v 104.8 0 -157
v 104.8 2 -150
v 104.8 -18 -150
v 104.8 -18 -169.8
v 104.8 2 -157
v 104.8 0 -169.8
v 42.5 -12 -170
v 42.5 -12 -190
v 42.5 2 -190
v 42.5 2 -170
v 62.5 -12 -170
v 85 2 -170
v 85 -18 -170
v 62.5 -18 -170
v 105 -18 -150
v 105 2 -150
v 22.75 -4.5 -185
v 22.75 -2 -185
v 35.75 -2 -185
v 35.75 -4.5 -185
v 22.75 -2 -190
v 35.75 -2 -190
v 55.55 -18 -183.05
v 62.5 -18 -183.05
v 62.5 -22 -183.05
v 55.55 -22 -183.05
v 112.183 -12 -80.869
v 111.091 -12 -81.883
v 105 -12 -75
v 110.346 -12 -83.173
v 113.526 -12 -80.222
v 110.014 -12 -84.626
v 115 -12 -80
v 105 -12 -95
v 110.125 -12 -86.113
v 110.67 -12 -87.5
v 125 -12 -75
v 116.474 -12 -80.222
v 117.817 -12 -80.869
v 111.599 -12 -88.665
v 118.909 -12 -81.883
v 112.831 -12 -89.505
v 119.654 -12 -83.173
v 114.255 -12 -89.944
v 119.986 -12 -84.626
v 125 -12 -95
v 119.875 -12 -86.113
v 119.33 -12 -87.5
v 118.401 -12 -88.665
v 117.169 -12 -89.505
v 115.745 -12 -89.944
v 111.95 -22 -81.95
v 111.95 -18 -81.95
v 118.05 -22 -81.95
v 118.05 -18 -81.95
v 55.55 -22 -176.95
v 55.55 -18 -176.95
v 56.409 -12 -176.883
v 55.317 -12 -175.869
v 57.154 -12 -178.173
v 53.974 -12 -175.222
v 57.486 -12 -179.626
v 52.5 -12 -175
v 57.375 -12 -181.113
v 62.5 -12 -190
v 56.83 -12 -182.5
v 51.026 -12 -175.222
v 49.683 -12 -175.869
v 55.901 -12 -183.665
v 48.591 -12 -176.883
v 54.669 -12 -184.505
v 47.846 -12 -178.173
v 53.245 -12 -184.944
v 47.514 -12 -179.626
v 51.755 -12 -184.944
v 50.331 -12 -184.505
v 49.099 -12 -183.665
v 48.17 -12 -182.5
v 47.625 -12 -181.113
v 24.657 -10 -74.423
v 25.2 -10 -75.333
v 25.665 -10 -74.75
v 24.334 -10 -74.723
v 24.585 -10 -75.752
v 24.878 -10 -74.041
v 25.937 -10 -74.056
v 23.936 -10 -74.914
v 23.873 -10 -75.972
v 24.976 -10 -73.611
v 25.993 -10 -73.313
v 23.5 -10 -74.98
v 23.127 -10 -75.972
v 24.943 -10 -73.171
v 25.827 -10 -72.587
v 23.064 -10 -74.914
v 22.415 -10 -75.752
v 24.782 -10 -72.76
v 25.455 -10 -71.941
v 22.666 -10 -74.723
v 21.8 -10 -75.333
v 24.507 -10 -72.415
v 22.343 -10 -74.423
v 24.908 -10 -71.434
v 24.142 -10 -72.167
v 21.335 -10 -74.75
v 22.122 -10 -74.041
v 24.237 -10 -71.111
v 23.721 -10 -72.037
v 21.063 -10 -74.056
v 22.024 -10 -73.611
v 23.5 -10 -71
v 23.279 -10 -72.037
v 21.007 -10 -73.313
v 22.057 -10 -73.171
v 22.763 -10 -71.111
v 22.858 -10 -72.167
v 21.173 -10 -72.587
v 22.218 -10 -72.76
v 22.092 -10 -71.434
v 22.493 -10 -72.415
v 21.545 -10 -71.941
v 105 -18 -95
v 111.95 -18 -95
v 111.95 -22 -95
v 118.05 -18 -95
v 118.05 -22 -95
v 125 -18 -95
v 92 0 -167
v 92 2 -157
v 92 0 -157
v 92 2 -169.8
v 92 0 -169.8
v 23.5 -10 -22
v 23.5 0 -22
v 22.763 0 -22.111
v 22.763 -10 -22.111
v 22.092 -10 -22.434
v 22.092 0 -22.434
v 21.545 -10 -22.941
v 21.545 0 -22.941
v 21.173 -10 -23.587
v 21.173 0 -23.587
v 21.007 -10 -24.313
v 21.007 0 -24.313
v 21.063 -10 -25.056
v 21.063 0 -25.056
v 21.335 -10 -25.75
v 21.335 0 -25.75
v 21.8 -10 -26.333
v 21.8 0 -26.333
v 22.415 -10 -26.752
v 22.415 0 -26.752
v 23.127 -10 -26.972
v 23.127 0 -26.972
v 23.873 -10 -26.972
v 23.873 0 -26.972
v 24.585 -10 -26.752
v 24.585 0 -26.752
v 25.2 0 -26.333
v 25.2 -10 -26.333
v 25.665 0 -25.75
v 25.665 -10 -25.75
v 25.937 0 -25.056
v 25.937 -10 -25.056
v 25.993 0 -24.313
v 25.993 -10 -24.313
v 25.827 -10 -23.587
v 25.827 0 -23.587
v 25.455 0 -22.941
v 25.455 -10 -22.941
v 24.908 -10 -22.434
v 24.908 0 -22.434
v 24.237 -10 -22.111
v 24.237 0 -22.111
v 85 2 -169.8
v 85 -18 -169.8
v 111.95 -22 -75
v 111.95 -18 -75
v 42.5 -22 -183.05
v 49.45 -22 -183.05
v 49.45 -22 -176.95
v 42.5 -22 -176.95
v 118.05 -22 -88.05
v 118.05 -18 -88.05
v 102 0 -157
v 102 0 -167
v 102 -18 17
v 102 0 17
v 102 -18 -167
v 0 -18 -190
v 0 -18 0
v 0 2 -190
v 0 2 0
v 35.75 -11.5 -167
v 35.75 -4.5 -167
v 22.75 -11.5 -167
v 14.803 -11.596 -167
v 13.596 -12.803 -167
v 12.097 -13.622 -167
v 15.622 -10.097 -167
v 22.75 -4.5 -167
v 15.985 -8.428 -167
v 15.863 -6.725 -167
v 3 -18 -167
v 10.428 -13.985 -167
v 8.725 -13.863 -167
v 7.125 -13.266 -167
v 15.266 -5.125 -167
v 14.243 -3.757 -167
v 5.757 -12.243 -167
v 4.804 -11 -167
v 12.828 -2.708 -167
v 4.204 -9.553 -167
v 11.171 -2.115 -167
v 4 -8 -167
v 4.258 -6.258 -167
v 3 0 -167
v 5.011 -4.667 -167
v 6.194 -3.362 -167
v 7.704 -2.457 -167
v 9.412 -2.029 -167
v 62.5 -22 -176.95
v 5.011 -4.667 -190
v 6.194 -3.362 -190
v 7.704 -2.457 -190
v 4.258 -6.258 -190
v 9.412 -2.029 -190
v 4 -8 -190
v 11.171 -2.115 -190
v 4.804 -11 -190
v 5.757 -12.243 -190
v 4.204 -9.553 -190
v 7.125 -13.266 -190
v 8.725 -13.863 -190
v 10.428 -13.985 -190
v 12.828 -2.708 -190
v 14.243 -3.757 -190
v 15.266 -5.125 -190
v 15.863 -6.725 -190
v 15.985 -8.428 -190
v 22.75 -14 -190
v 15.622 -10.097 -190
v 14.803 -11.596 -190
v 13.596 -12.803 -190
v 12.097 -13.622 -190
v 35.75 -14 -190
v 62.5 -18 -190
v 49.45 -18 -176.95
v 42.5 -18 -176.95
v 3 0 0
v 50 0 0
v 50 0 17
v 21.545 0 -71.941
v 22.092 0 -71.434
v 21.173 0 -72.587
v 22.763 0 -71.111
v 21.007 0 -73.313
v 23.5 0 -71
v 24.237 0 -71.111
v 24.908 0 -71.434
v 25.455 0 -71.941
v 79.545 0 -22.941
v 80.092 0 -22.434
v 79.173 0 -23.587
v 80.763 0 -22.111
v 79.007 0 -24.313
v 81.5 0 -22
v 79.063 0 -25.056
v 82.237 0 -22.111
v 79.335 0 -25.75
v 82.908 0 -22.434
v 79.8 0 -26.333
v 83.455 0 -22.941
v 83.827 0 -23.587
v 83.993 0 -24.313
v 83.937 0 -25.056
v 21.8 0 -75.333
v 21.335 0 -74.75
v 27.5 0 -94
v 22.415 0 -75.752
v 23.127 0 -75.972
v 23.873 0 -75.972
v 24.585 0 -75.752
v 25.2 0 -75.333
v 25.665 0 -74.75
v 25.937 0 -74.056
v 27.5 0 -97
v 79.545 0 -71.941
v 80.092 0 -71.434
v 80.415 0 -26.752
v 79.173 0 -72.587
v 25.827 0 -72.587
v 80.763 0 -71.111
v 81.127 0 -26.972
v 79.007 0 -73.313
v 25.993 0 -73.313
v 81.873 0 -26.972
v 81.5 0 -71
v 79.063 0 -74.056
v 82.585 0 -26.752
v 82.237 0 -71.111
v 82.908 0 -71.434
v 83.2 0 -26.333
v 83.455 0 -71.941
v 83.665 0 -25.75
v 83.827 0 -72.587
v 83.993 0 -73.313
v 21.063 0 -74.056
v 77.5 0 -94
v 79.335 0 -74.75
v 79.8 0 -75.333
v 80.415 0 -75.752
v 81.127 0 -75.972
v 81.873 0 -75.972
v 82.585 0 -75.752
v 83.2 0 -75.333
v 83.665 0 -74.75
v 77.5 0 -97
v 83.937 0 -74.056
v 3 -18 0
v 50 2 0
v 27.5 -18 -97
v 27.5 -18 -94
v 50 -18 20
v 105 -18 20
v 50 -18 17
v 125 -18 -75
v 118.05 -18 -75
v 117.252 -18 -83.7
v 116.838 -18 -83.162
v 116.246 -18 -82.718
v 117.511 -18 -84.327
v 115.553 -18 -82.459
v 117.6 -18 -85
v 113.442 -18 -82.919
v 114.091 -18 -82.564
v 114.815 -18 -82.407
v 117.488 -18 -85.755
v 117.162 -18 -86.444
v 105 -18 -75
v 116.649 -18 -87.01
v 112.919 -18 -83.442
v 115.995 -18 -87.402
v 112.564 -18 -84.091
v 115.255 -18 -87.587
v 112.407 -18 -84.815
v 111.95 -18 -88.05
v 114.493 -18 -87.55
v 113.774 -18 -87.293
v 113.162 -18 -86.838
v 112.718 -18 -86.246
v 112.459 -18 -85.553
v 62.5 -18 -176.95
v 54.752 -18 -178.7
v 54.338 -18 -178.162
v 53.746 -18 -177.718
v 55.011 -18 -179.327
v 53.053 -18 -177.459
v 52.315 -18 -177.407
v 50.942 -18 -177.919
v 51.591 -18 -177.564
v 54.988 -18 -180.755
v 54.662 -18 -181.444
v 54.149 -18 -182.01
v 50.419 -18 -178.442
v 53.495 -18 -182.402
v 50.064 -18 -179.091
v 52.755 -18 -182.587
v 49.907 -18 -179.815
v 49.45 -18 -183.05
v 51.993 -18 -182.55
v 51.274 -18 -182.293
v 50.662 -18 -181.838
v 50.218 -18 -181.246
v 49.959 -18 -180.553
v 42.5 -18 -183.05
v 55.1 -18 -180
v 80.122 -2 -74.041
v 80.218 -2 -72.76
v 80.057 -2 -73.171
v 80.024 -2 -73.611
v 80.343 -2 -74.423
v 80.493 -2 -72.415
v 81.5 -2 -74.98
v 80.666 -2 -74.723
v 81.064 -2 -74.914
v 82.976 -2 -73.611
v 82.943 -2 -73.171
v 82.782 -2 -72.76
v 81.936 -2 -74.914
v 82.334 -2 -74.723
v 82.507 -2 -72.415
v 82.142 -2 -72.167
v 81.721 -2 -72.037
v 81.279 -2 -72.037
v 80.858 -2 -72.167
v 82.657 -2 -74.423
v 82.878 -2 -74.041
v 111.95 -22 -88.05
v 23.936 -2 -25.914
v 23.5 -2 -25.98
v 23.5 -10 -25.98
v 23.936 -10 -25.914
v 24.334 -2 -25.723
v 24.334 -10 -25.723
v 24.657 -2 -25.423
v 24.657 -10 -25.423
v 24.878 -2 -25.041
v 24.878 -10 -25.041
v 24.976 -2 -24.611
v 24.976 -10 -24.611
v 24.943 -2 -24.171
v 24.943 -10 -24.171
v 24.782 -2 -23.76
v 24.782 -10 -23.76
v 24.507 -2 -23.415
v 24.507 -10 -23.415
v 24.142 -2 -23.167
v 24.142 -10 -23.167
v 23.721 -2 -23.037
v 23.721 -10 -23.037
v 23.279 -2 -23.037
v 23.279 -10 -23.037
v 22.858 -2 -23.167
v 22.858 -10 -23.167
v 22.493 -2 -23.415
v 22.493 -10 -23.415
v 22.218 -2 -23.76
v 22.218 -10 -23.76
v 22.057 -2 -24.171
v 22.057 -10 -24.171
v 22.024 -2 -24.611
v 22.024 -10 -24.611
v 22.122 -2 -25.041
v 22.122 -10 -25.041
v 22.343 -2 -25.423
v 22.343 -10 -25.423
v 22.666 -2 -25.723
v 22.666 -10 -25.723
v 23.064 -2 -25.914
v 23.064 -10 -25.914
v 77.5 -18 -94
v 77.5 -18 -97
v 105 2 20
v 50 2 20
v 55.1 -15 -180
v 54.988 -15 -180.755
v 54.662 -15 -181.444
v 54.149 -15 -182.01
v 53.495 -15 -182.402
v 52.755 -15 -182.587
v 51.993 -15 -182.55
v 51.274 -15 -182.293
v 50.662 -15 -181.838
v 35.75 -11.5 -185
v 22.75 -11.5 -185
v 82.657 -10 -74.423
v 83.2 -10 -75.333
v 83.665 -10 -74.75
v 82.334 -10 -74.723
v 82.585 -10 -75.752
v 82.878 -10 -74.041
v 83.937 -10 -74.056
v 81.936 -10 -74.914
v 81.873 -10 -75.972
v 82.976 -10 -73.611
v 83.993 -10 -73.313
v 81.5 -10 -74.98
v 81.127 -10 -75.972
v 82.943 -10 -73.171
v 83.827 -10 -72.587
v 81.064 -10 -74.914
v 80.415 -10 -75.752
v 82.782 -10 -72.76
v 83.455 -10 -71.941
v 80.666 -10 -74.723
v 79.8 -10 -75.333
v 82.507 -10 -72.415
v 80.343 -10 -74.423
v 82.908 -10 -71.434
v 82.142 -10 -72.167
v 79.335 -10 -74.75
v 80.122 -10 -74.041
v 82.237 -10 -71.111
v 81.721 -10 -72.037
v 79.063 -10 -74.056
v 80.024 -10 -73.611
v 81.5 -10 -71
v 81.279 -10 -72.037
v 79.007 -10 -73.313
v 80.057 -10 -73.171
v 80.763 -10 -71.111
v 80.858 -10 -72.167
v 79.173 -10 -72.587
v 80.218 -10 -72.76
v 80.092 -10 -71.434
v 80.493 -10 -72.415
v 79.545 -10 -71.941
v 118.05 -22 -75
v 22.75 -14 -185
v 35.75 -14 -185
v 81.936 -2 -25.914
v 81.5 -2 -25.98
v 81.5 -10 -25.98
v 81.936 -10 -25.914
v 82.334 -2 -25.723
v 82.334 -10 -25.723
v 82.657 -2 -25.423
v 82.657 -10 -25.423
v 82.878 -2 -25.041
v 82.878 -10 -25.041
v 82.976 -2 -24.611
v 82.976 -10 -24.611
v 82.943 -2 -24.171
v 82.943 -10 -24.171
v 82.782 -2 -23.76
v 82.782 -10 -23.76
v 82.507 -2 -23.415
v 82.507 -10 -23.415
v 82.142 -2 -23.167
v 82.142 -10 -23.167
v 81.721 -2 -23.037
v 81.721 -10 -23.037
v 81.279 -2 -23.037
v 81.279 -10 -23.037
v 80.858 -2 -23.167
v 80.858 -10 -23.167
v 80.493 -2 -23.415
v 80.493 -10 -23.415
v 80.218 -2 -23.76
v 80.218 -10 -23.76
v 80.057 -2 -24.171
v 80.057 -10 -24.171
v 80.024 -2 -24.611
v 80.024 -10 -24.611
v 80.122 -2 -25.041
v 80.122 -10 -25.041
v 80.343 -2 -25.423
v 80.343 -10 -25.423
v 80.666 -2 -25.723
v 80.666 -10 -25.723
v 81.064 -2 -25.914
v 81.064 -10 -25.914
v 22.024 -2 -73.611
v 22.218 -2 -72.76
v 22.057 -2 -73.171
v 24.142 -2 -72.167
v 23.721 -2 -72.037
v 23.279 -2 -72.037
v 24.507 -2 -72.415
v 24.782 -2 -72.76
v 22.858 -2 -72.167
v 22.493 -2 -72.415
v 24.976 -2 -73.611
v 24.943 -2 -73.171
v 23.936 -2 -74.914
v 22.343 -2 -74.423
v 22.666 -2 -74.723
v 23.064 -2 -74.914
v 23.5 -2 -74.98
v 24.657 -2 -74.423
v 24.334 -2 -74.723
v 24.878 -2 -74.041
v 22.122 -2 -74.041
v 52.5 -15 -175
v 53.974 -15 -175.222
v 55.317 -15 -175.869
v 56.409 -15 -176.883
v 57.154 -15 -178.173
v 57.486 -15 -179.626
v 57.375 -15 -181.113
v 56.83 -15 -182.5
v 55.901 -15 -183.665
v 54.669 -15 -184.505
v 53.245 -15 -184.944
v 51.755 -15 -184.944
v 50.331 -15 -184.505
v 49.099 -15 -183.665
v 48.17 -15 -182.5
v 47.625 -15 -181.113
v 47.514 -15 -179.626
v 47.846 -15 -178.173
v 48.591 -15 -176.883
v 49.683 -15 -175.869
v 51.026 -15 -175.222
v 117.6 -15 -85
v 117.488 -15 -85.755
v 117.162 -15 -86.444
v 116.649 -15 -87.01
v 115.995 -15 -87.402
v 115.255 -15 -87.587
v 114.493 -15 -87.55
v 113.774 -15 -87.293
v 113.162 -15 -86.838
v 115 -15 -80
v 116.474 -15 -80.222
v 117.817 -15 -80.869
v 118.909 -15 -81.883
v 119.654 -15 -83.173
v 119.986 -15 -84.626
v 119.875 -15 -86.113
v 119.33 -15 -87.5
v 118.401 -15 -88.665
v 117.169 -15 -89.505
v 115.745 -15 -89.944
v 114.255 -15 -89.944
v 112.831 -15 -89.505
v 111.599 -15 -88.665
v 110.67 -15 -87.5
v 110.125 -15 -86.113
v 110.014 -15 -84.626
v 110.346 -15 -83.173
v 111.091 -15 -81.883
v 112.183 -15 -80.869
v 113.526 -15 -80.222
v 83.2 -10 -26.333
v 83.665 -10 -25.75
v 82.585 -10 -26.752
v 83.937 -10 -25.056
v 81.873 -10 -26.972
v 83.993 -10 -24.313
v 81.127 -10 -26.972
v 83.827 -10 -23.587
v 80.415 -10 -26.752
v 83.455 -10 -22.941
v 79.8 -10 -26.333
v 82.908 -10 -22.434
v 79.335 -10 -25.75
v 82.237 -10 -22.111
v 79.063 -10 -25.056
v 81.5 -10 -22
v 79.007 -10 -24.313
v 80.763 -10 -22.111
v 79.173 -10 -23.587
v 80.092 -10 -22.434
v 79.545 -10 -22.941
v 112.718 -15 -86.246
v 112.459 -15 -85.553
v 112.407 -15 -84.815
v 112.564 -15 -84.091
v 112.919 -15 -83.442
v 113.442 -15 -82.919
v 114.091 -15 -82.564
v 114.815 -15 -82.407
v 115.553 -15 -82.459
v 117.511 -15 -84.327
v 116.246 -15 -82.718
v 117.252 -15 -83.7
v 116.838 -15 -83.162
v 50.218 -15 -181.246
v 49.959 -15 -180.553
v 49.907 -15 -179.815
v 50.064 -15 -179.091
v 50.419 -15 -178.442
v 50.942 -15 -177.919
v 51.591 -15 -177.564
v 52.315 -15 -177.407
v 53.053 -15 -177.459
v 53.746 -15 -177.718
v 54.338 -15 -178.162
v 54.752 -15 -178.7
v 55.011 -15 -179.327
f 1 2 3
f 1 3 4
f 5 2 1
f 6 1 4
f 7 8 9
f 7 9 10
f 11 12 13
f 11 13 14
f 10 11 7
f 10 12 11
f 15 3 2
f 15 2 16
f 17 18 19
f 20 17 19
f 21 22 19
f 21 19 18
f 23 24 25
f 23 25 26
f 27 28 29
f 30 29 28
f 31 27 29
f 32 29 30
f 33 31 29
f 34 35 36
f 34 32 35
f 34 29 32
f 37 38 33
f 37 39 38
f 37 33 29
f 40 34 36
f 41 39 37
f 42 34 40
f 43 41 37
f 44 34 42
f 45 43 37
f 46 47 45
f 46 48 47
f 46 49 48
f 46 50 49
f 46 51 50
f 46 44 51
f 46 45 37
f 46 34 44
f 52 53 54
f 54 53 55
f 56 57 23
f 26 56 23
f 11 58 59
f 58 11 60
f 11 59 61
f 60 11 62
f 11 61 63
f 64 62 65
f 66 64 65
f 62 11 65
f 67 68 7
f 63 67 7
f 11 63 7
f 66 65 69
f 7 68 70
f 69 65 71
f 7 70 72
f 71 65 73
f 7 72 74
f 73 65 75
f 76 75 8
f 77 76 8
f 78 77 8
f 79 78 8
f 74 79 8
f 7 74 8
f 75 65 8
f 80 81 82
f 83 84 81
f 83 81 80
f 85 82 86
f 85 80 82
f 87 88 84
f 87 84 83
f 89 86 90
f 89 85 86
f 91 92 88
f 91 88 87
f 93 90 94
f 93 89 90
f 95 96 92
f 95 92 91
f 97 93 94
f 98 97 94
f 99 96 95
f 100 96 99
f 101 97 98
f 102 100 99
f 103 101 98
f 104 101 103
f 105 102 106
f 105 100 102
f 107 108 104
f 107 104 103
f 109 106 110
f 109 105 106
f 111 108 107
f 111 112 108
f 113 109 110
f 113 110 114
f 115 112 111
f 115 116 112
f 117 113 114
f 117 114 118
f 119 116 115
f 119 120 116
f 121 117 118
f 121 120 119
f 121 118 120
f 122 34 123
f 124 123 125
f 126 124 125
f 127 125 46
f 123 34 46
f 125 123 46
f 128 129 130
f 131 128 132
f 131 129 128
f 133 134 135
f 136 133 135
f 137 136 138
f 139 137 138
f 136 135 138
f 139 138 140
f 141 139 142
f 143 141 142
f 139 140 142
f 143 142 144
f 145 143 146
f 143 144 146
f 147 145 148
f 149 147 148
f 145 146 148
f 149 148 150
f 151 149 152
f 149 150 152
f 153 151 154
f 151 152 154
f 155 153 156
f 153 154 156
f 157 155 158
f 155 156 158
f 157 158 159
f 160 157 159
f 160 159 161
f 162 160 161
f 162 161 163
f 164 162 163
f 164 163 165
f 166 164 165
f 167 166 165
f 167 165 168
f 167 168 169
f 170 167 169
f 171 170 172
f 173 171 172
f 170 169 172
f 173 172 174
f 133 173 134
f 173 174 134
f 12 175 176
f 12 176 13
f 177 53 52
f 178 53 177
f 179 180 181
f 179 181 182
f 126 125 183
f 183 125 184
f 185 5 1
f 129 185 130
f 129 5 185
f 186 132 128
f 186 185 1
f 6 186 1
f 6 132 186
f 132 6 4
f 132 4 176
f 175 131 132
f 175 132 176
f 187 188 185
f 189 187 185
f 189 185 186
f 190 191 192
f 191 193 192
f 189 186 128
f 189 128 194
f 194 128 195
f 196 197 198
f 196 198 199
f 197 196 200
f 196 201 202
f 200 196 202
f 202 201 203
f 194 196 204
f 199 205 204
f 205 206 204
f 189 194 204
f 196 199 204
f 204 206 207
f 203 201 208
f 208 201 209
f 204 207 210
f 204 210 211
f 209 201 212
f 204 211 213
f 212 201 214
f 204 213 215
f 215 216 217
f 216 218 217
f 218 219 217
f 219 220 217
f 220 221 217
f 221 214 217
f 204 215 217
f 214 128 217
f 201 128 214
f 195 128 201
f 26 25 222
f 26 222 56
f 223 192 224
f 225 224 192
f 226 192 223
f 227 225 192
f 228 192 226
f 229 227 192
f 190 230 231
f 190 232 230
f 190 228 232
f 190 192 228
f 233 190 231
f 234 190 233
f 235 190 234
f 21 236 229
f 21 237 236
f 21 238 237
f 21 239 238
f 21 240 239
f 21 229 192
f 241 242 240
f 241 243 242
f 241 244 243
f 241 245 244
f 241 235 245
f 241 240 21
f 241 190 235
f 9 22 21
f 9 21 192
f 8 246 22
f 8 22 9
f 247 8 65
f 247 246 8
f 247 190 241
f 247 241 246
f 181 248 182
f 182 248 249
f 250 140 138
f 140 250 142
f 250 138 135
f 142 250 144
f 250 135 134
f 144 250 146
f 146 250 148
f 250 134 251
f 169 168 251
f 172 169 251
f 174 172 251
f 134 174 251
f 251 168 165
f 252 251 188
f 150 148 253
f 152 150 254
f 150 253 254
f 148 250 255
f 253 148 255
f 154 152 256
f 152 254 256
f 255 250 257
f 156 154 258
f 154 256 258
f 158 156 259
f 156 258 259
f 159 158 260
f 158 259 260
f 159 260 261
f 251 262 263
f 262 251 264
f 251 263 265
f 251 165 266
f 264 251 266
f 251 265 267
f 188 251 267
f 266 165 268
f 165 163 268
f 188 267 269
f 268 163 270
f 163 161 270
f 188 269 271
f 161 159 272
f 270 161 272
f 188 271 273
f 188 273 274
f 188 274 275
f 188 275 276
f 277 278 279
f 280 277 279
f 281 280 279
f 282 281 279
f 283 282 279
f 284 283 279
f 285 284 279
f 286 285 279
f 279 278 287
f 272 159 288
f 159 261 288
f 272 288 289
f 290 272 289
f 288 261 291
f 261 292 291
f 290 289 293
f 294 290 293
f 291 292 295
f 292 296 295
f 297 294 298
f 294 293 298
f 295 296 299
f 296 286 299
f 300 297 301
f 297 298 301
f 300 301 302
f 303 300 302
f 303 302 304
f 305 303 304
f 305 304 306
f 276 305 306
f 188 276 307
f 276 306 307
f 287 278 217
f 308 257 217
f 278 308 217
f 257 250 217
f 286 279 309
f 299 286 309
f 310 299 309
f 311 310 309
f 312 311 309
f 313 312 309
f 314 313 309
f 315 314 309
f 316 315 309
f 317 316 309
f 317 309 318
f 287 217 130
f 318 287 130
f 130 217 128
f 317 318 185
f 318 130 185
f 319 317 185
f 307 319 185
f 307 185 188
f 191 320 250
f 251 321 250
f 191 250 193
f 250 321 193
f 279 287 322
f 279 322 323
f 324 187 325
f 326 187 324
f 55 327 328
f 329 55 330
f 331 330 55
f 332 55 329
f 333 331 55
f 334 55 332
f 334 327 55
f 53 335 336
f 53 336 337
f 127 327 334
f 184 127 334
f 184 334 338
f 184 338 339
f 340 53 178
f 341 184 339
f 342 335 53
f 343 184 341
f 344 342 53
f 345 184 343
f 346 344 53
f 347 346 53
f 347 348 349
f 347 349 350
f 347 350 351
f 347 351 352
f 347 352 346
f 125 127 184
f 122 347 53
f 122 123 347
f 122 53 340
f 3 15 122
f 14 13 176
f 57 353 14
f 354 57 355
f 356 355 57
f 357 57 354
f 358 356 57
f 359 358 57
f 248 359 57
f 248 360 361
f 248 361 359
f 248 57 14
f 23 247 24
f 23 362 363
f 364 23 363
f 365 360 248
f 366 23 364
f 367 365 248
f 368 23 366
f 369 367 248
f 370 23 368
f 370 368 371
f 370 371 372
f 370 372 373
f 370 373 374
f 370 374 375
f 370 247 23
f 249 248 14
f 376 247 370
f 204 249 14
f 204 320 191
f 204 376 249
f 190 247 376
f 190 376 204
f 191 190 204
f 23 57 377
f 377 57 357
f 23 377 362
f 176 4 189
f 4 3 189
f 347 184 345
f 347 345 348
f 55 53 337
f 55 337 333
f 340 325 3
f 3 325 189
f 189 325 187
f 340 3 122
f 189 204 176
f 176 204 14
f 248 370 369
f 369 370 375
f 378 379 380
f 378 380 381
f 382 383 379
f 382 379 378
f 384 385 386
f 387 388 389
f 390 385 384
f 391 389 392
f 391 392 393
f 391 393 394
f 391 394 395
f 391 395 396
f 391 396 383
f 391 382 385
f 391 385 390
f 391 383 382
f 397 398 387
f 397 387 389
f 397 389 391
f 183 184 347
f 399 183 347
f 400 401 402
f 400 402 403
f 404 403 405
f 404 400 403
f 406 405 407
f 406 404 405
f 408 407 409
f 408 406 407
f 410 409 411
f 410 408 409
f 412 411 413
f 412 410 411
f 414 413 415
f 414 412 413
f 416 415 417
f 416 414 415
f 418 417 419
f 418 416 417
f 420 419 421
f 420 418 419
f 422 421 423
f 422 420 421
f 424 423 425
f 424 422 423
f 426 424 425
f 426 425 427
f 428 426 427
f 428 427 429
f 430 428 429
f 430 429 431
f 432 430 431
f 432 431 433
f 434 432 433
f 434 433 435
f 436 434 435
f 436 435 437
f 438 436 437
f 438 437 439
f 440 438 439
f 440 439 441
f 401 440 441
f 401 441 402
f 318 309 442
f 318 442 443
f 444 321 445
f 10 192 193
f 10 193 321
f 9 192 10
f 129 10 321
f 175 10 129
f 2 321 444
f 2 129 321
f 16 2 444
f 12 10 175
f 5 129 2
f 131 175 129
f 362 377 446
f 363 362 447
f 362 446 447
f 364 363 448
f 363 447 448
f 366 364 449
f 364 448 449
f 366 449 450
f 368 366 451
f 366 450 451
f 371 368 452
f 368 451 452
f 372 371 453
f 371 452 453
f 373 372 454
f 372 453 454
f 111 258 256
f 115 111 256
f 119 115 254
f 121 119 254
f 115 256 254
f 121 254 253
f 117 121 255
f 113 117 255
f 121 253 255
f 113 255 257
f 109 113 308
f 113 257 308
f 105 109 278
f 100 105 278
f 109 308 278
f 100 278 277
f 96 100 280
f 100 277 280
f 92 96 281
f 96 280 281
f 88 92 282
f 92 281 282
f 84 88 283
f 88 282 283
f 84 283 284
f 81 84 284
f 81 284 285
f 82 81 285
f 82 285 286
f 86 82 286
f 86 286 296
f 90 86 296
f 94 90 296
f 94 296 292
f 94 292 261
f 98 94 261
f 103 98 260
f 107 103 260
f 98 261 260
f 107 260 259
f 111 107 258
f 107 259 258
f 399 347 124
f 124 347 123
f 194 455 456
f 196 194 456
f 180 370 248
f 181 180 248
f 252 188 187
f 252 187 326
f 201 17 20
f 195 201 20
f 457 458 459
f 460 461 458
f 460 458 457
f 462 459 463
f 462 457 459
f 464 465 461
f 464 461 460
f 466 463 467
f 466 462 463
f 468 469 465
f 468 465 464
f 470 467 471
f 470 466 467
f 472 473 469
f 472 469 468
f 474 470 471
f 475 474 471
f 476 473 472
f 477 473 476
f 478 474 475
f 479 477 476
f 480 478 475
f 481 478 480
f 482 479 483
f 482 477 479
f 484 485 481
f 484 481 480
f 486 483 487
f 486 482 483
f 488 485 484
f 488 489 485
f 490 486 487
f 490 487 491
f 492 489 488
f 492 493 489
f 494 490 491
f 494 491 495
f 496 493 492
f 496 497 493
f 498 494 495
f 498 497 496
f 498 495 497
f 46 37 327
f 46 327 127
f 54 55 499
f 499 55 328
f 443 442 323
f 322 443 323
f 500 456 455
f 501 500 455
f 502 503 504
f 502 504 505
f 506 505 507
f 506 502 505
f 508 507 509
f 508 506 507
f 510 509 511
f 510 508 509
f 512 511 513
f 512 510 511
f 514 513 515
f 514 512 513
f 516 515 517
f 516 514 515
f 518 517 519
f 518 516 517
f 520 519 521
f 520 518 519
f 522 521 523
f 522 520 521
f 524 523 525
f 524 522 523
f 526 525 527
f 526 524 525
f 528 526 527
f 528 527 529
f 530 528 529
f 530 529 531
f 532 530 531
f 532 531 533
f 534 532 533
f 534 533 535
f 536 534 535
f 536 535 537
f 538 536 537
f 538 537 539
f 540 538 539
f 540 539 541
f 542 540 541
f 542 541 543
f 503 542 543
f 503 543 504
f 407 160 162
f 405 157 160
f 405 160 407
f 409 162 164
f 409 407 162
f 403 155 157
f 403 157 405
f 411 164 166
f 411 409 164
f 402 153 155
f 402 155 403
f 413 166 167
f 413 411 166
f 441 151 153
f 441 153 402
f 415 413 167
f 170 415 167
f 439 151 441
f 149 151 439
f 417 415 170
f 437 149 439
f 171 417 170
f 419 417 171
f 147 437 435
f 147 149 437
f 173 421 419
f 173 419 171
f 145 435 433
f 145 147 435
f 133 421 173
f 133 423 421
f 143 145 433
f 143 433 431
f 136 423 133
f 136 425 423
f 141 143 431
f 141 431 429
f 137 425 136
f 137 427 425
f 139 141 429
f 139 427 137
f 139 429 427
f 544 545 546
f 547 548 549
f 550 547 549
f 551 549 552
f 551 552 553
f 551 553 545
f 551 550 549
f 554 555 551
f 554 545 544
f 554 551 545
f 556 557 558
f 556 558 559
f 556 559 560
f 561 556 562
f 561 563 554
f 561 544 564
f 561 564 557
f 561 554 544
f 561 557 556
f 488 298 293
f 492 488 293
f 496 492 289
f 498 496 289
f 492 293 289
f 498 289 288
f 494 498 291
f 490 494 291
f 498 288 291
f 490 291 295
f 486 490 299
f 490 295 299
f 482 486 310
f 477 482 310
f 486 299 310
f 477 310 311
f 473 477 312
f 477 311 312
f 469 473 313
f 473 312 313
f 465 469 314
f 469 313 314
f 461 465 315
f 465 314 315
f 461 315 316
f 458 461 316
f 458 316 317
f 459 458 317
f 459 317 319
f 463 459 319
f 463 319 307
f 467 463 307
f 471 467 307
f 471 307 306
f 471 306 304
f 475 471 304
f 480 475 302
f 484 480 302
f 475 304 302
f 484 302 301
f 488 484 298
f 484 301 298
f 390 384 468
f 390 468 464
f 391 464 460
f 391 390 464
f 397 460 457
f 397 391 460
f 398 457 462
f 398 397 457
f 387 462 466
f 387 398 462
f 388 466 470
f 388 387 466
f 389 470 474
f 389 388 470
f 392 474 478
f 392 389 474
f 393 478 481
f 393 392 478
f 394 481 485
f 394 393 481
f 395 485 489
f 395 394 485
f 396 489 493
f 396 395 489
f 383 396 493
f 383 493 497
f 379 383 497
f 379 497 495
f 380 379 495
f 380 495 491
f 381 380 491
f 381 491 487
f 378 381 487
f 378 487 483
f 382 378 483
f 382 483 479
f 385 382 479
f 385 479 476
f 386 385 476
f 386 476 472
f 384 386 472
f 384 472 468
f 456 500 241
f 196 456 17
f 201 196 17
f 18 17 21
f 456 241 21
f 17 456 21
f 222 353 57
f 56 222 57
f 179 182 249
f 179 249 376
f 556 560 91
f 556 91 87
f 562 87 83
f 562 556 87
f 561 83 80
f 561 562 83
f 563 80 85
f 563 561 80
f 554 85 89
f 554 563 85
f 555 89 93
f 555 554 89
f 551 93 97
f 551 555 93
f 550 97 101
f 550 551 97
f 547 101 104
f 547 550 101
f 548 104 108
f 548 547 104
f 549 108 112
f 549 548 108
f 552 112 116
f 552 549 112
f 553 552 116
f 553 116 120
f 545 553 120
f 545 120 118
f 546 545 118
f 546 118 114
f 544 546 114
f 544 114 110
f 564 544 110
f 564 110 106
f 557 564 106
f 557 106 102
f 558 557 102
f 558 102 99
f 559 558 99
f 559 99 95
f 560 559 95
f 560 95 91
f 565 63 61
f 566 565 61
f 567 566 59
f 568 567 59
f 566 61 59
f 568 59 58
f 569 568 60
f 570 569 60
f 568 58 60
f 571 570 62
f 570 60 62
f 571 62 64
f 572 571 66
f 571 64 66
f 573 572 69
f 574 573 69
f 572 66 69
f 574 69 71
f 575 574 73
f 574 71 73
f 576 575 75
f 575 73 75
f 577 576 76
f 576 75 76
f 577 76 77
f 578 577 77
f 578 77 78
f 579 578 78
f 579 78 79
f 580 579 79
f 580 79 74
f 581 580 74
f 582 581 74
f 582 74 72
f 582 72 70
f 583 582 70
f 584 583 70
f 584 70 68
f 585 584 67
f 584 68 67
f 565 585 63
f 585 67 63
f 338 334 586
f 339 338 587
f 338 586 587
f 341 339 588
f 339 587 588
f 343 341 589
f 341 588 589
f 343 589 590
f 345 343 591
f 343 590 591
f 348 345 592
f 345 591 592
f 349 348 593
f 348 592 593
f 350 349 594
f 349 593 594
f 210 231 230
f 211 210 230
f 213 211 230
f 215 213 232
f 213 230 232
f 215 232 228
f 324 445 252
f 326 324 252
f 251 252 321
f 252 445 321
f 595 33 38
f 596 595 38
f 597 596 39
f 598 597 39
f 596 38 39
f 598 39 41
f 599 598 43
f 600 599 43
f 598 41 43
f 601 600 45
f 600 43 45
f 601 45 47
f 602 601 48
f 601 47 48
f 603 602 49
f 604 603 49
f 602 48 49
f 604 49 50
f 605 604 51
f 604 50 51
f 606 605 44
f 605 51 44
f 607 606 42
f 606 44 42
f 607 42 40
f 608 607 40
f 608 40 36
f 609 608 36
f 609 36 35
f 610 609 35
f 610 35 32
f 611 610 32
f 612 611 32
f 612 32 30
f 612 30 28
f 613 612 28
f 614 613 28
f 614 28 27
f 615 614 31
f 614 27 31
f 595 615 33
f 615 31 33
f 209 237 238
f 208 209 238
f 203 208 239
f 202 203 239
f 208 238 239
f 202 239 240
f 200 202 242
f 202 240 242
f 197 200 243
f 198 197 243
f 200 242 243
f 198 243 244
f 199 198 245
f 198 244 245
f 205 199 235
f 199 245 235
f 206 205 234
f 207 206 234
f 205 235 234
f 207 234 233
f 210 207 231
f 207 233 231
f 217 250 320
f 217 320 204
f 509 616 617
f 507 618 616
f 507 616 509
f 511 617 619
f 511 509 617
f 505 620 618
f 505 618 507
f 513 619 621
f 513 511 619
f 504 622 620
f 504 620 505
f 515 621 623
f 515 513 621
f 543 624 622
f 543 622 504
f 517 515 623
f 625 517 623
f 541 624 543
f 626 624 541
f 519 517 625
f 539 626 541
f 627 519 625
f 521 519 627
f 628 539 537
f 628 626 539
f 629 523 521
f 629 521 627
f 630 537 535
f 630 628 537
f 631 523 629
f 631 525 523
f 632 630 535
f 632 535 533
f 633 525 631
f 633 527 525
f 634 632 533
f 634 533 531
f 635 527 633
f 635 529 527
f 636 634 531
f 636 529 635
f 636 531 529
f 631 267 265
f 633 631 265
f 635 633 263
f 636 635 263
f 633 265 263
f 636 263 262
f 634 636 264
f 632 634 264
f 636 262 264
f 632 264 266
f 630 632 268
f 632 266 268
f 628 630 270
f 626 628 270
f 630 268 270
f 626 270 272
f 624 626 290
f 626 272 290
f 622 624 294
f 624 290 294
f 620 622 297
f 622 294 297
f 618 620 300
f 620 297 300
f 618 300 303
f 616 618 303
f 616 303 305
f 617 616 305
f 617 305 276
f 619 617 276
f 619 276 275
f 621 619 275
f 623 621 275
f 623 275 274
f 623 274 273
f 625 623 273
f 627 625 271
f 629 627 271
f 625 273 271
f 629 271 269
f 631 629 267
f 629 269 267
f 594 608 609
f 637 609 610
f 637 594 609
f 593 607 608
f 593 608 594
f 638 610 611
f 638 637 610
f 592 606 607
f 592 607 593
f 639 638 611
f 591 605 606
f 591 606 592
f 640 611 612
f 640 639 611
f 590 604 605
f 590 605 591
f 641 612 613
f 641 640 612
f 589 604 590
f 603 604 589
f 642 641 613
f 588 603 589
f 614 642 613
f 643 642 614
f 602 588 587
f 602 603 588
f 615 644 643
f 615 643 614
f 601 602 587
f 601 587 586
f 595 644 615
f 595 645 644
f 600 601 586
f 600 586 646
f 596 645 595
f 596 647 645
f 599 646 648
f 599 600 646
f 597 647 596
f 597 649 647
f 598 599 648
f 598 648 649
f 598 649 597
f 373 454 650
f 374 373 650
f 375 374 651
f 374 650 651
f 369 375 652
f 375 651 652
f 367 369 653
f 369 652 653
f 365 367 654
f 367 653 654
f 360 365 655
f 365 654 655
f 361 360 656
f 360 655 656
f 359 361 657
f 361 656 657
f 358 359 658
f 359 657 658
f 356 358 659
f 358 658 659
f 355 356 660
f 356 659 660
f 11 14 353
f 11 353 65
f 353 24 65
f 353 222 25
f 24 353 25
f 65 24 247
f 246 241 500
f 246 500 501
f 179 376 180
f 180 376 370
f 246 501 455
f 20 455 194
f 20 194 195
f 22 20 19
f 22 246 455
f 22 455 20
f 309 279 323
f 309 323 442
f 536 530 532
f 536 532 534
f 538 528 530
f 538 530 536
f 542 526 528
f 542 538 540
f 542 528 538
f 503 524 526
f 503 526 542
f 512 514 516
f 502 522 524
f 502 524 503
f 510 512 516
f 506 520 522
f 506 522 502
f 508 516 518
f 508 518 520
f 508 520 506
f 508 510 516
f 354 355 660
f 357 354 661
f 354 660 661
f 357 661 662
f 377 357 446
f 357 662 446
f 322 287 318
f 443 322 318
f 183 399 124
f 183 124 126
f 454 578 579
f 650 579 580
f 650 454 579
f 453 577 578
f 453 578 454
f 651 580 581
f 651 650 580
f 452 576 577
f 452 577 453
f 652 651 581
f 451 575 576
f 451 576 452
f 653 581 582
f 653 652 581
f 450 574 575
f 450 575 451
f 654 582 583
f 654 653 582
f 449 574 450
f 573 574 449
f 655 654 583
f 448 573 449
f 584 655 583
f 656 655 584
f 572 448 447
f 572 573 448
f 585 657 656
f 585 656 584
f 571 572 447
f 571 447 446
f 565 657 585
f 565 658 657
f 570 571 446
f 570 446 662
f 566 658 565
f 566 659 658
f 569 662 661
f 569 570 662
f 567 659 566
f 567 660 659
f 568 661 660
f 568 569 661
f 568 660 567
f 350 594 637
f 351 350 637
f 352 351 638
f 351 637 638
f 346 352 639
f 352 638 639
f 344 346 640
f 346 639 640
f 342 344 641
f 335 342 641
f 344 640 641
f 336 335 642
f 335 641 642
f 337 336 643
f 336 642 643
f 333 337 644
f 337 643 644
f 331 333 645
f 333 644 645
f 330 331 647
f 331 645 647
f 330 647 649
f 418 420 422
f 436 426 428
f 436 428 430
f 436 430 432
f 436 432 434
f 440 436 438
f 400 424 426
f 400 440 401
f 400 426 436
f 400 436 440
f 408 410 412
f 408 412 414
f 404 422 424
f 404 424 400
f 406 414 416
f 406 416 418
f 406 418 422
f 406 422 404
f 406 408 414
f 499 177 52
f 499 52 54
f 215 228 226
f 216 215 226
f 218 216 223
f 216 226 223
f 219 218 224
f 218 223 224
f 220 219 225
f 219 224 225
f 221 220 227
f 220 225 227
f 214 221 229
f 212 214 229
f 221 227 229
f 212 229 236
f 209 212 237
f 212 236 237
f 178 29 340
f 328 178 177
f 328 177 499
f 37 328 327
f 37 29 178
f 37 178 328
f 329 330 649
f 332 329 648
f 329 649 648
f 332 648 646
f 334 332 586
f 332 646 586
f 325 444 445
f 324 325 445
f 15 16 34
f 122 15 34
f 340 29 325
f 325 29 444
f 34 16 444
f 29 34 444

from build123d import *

# Parameters (mm, degrees)
SKETCH_1_W           = 105
SKETCH_1_H           = 170
EXTRUDE_1_DEPTH      = 2
SKETCH_2_W           = 23
SKETCH_2_H           = 20
EXTRUDE_2_DEPTH      = 20
SKETCH_3_W           = 20
SKETCH_3_H           = 20
CUT_EXTRUDE_1_DEPTH  = 14
SKETCH_4_R           = 2.6
CUT_EXTRUDE_2_DEPTH  = 14
SKETCH_5_R           = 5
CUT_EXTRUDE_3_DEPTH  = 3
SKETCH_6_W           = 3
SKETCH_6_H           = 75
EXTRUDE_3_DEPTH      = 18
SKETCH_7_W           = 102
SKETCH_7_H           = 3
EXTRUDE_4_DEPTH      = 18
SKETCH_8_W           = 20
SKETCH_8_H           = 20
EXTRUDE_5_DEPTH      = 6
SKETCH_9_R           = 2.6
CUT_EXTRUDE_4_DEPTH  = 6
SKETCH_10_R          = 5
CUT_EXTRUDE_5_DEPTH  = 3
SKETCH_11_W          = 6.1
SKETCH_11_H          = 6.95
EXTRUDE_6_DEPTH      = 4
SKETCH_12_W          = 6.95
SKETCH_12_H          = 6.1
EXTRUDE_7_DEPTH      = 4
SKETCH_13_W          = 55
SKETCH_13_H          = 3
EXTRUDE_8_DEPTH      = 20
SKETCH_14_W          = 20
SKETCH_14_H          = 20
CUT_EXTRUDE_6_DEPTH  = 2
SKETCH_15_W          = 42.5
SKETCH_15_H          = 20
EXTRUDE_9_DEPTH      = 20
SKETCH_16_R          = 6
CUT_EXTRUDE_7_DEPTH  = 30
CUT_EXTRUDE_9_DEPTH  = 30
CUT_EXTRUDE_10_DEPTH = 30
EXTRUDE_17_DEPTH     = 2
CUT_EXTRUDE_11_DEPTH = 5
SKETCH_25_W          = 52
SKETCH_25_H          = 3
CUT_EXTRUDE_12_DEPTH = 18
SKETCH_26_W          = 105
SKETCH_26_H          = 20
EXTRUDE_18_DEPTH     = 2
EXTRUDE_19_DEPTH     = 18
SKETCH_28_W          = 50
SKETCH_28_H          = 20
CUT_EXTRUDE_13_DEPTH = 18
SKETCH_29_W          = 3
SKETCH_29_H          = 167
EXTRUDE_20_DEPTH     = 18
SKETCH_30_R          = 2.5
SKETCH_30_R_2        = 1.48
EXTRUDE_21_DEPTH     = 10
SKETCH_31_R          = 1.48
EXTRUDE_22_DEPTH     = 2
EXTRUDE_24_DEPTH     = 18


with BuildPart() as part:
    # 草图1 → 凸台-拉伸1 (new body)
    with BuildSketch(Plane(origin=(0, 0, 0), x_dir=(1, 0, 0), z_dir=(0, 1, 0))):
        with Locations((52.5, 85)):
            Rectangle(SKETCH_1_W, SKETCH_1_H)
    extrude(amount=EXTRUDE_1_DEPTH)

    # 草图2 → 凸台-拉伸2 (add)
    with BuildSketch(Plane(origin=(0, 2, 0), x_dir=(1, 0, 0), z_dir=(0, 1, 0))):
        with Locations((113.5, 85)):
            Rectangle(SKETCH_2_W, SKETCH_2_H)
    extrude(amount=-EXTRUDE_2_DEPTH)

    # 草图3 → 切除-拉伸1 (cut)
    with BuildSketch(Plane(origin=(0, 2, 0), x_dir=(1, 0, 0), z_dir=(0, 1, 0))):
        with Locations((115, 85)):
            Rectangle(SKETCH_3_W, SKETCH_3_H)
    extrude(amount=-CUT_EXTRUDE_1_DEPTH, mode=Mode.SUBTRACT)

    # 草图4 → 切除-拉伸2 (cut)
    with BuildSketch(Plane(origin=(0, -12, 0), x_dir=(1, 0, 0), z_dir=(0, 1, 0))):
        with Locations((115, 85)):
            Circle(SKETCH_4_R)
    extrude(amount=-CUT_EXTRUDE_2_DEPTH, mode=Mode.SUBTRACT)

    # 草图5 → 切除-拉伸3 (cut)
    with BuildSketch(Plane(origin=(0, -12, 0), x_dir=(1, 0, 0), z_dir=(0, 1, 0))):
        with Locations((115, 85)):
            Circle(SKETCH_5_R)
    extrude(amount=-CUT_EXTRUDE_3_DEPTH, mode=Mode.SUBTRACT)

    # 草图6 → 凸台-拉伸3 (add)
    with BuildSketch(Plane.XZ):
        with Locations((103.5, -132.5)):
            Rectangle(SKETCH_6_W, SKETCH_6_H)
        with Locations((103.5, -37.5)):
            Rectangle(SKETCH_6_W, SKETCH_6_H)
    extrude(amount=EXTRUDE_3_DEPTH)

    # 草图7 → 凸台-拉伸4 (add)
    with BuildSketch(Plane(origin=(0, 0, 0), x_dir=(-1, 0, 0), z_dir=(0, -1, 0))):
        with Locations((-51, 168.5)):
            Rectangle(SKETCH_7_W, SKETCH_7_H)
    extrude(amount=EXTRUDE_4_DEPTH)

    # 草图8 → 凸台-拉伸5 (add)
    with BuildSketch(Plane(origin=(0, -18, 0), x_dir=(-1, 0, 0), z_dir=(0, -1, 0))):
        with Locations((-52.5, 180)):
            Rectangle(SKETCH_8_W, SKETCH_8_H)
    extrude(amount=-EXTRUDE_5_DEPTH)

    # 草图9 → 切除-拉伸4 (cut)
    with BuildSketch(Plane(origin=(0, -12, 0), x_dir=(1, 0, 0), z_dir=(0, 1, 0))):
        with Locations((52.5, 180)):
            Circle(SKETCH_9_R)
    extrude(amount=-CUT_EXTRUDE_4_DEPTH, mode=Mode.SUBTRACT)

    # 草图10 → 切除-拉伸5 (cut)
    with BuildSketch(Plane(origin=(0, -12, 0), x_dir=(1, 0, 0), z_dir=(0, 1, 0))):
        with Locations((52.5, 180)):
            Circle(SKETCH_10_R)
    extrude(amount=-CUT_EXTRUDE_5_DEPTH, mode=Mode.SUBTRACT)

    # 草图11 → 凸台-拉伸6 (add)
    with BuildSketch(Plane.XZ.offset(18)):
        with Locations((115, -78.475)):
            Rectangle(SKETCH_11_W, SKETCH_11_H)
        with Locations((115, -91.525)):
            Rectangle(SKETCH_11_W, SKETCH_11_H)
    extrude(amount=EXTRUDE_6_DEPTH)

    # 草图12 → 凸台-拉伸7 (add)
    with BuildSketch(Plane(origin=(0, -18, 0), x_dir=(-1, 0, 0), z_dir=(0, -1, 0))):
        with Locations((-59.025, 180)):
            Rectangle(SKETCH_12_W, SKETCH_12_H)
        with Locations((-45.975, 180)):
            Rectangle(SKETCH_12_W, SKETCH_12_H)
    extrude(amount=EXTRUDE_7_DEPTH)

    # 草图13 → 凸台-拉伸8 (add)
    with BuildSketch(Plane(origin=(0, 2, 0), x_dir=(1, 0, 0), z_dir=(0, 1, 0))):
        with Locations((77.5, 1.5)):
            Rectangle(SKETCH_13_W, SKETCH_13_H)
    extrude(amount=-EXTRUDE_8_DEPTH)

    # 草图14 → 切除-拉伸6 (cut)
    with BuildSketch(Plane(origin=(0, 2, 0), x_dir=(1, 0, 0), z_dir=(0, 1, 0))):
        with Locations((95, 160)):
            Rectangle(SKETCH_14_W, SKETCH_14_H)
    extrude(amount=-CUT_EXTRUDE_6_DEPTH, mode=Mode.SUBTRACT)

    # 草图15 → 凸台-拉伸9 (add)
    with BuildSketch(Plane.XZ.offset(18)):
        with Locations((21.25, -180)):
            Rectangle(SKETCH_15_W, SKETCH_15_H)
    extrude(amount=-EXTRUDE_9_DEPTH)

    # 草图16 → 切除-拉伸7 (cut)
    with BuildSketch(Plane(origin=(0, 0, -190), x_dir=(-1, 0, 0), z_dir=(0, 0, -1))):
        with Locations((-10, -8)):
            Circle(SKETCH_16_R)
    extrude(amount=-CUT_EXTRUDE_7_DEPTH, mode=Mode.SUBTRACT)

    # 草图17 → 切除-拉伸9 (cut)
    with BuildSketch(Plane(origin=(0, 0, -190), x_dir=(-1, 0, 0), z_dir=(0, 0, -1))):
        Polygon((-22.75, -4.5), (-29.25, -4.5), (-35.75, -4.5), (-35.75, -11.5), (-29.25, -11.5), (-22.75, -11.5), align=None)
    extrude(amount=-CUT_EXTRUDE_9_DEPTH, mode=Mode.SUBTRACT)

    # 草图19 → 切除-拉伸10 (cut)
    with BuildSketch(Plane(origin=(0, 0, 0), x_dir=(1, 0, 0), z_dir=(0, 1, 0))):
        Polygon((105, 150), (105, 170), (85, 170), (85, 169.8), (104.8, 169.8), (104.8, 150), align=None)
    extrude(amount=-CUT_EXTRUDE_10_DEPTH, mode=Mode.SUBTRACT)

    # 草图21 → 凸台-拉伸17 (add)
    with BuildSketch(Plane(origin=(0, 2, 0), x_dir=(1, 0, 0), z_dir=(0, 1, 0))):
        Polygon((102, 157), (92, 157), (92, 167), (92, 169.8), (85, 169.8), (85, 167), (85, 150), (102, 150), (104.8, 150), (104.8, 157), align=None)
    extrude(amount=-EXTRUDE_17_DEPTH)

    # 草图23 → 切除-拉伸11 (cut)
    with BuildSketch(Plane(origin=(0, 0, -190), x_dir=(-1, 0, 0), z_dir=(0, 0, -1))):
        Polygon((-22.75, -11.5), (-22.75, -14), (-35.75, -14), (-35.75, -2), (-22.75, -2), align=None)
    extrude(amount=-CUT_EXTRUDE_11_DEPTH, mode=Mode.SUBTRACT)

    # 草图25 → 切除-拉伸12 (cut)
    with BuildSketch(Plane(origin=(0, -18, 0), x_dir=(-1, 0, 0), z_dir=(0, -1, 0))):
        with Locations((-76, 1.5)):
            Rectangle(SKETCH_25_W, SKETCH_25_H)
    extrude(amount=-CUT_EXTRUDE_12_DEPTH, mode=Mode.SUBTRACT)

    # 草图26 → 凸台-拉伸18 (add)
    with BuildSketch(Plane(origin=(0, 2, 0), x_dir=(1, 0, 0), z_dir=(0, 1, 0))):
        with Locations((52.5, -10)):
            Rectangle(SKETCH_26_W, SKETCH_26_H)
    extrude(amount=-EXTRUDE_18_DEPTH)

    # 草图27 → 凸台-拉伸19 (add)
    with BuildSketch(Plane(origin=(0, 0, 0), x_dir=(-1, 0, 0), z_dir=(0, -1, 0))):
        Polygon((-102, -17), (-102, 0), (-105, 0), (-105, -20), (-50, -20), (-50, -17), align=None)
    extrude(amount=EXTRUDE_19_DEPTH)

    # 草图28 → 切除-拉伸13 (cut)
    with BuildSketch(Plane.XZ):
        with Locations((25, 10)):
            Rectangle(SKETCH_28_W, SKETCH_28_H)
    extrude(amount=-CUT_EXTRUDE_13_DEPTH, mode=Mode.SUBTRACT)

    # 草图29 → 凸台-拉伸20 (add)
    with BuildSketch(Plane(origin=(0, 0, 0), x_dir=(-1, 0, 0), z_dir=(0, -1, 0))):
        with Locations((-1.5, 83.5)):
            Rectangle(SKETCH_29_W, SKETCH_29_H)
    extrude(amount=EXTRUDE_20_DEPTH)

    # 草图30 → 凸台-拉伸21 (add)
    # profile 1 of 4: a face of its own
    with BuildSketch(Plane.XZ):
        with Locations((23.5, -24.5)):
            Circle(SKETCH_30_R)
        with Locations((23.5, -24.5)):
            Circle(SKETCH_30_R_2, mode=Mode.SUBTRACT)
    # profile 2 of 4: a face of its own
    with BuildSketch(Plane.XZ):
        with Locations((81.5, -24.5)):
            Circle(SKETCH_30_R)
        with Locations((81.5, -24.5)):
            Circle(SKETCH_30_R_2, mode=Mode.SUBTRACT)
    # profile 3 of 4: a face of its own
    with BuildSketch(Plane.XZ):
        with Locations((81.5, -73.5)):
            Circle(SKETCH_30_R)
        with Locations((81.5, -73.5)):
            Circle(SKETCH_30_R_2, mode=Mode.SUBTRACT)
    # profile 4 of 4: a face of its own
    with BuildSketch(Plane.XZ):
        with Locations((23.5, -73.5)):
            Circle(SKETCH_30_R)
        with Locations((23.5, -73.5)):
            Circle(SKETCH_30_R_2, mode=Mode.SUBTRACT)
    extrude(amount=EXTRUDE_21_DEPTH)

    # 草图31 → 凸台-拉伸22 (add)
    with BuildSketch(Plane.XZ):
        with Locations((23.5, -24.5)):
            Circle(SKETCH_31_R)
        with Locations((81.5, -24.5)):
            Circle(SKETCH_31_R)
        with Locations((81.5, -73.5)):
            Circle(SKETCH_31_R)
        with Locations((23.5, -73.5)):
            Circle(SKETCH_31_R)
    extrude(amount=EXTRUDE_22_DEPTH)

    # 草图33 → 凸台-拉伸24 (add)
    with BuildSketch(Plane.XZ):
        Polygon((27.5, -97), (52.5, -97), (77.5, -97), (77.5, -94), (27.5, -94), align=None)
    extrude(amount=EXTRUDE_24_DEPTH)


solid = part.part
